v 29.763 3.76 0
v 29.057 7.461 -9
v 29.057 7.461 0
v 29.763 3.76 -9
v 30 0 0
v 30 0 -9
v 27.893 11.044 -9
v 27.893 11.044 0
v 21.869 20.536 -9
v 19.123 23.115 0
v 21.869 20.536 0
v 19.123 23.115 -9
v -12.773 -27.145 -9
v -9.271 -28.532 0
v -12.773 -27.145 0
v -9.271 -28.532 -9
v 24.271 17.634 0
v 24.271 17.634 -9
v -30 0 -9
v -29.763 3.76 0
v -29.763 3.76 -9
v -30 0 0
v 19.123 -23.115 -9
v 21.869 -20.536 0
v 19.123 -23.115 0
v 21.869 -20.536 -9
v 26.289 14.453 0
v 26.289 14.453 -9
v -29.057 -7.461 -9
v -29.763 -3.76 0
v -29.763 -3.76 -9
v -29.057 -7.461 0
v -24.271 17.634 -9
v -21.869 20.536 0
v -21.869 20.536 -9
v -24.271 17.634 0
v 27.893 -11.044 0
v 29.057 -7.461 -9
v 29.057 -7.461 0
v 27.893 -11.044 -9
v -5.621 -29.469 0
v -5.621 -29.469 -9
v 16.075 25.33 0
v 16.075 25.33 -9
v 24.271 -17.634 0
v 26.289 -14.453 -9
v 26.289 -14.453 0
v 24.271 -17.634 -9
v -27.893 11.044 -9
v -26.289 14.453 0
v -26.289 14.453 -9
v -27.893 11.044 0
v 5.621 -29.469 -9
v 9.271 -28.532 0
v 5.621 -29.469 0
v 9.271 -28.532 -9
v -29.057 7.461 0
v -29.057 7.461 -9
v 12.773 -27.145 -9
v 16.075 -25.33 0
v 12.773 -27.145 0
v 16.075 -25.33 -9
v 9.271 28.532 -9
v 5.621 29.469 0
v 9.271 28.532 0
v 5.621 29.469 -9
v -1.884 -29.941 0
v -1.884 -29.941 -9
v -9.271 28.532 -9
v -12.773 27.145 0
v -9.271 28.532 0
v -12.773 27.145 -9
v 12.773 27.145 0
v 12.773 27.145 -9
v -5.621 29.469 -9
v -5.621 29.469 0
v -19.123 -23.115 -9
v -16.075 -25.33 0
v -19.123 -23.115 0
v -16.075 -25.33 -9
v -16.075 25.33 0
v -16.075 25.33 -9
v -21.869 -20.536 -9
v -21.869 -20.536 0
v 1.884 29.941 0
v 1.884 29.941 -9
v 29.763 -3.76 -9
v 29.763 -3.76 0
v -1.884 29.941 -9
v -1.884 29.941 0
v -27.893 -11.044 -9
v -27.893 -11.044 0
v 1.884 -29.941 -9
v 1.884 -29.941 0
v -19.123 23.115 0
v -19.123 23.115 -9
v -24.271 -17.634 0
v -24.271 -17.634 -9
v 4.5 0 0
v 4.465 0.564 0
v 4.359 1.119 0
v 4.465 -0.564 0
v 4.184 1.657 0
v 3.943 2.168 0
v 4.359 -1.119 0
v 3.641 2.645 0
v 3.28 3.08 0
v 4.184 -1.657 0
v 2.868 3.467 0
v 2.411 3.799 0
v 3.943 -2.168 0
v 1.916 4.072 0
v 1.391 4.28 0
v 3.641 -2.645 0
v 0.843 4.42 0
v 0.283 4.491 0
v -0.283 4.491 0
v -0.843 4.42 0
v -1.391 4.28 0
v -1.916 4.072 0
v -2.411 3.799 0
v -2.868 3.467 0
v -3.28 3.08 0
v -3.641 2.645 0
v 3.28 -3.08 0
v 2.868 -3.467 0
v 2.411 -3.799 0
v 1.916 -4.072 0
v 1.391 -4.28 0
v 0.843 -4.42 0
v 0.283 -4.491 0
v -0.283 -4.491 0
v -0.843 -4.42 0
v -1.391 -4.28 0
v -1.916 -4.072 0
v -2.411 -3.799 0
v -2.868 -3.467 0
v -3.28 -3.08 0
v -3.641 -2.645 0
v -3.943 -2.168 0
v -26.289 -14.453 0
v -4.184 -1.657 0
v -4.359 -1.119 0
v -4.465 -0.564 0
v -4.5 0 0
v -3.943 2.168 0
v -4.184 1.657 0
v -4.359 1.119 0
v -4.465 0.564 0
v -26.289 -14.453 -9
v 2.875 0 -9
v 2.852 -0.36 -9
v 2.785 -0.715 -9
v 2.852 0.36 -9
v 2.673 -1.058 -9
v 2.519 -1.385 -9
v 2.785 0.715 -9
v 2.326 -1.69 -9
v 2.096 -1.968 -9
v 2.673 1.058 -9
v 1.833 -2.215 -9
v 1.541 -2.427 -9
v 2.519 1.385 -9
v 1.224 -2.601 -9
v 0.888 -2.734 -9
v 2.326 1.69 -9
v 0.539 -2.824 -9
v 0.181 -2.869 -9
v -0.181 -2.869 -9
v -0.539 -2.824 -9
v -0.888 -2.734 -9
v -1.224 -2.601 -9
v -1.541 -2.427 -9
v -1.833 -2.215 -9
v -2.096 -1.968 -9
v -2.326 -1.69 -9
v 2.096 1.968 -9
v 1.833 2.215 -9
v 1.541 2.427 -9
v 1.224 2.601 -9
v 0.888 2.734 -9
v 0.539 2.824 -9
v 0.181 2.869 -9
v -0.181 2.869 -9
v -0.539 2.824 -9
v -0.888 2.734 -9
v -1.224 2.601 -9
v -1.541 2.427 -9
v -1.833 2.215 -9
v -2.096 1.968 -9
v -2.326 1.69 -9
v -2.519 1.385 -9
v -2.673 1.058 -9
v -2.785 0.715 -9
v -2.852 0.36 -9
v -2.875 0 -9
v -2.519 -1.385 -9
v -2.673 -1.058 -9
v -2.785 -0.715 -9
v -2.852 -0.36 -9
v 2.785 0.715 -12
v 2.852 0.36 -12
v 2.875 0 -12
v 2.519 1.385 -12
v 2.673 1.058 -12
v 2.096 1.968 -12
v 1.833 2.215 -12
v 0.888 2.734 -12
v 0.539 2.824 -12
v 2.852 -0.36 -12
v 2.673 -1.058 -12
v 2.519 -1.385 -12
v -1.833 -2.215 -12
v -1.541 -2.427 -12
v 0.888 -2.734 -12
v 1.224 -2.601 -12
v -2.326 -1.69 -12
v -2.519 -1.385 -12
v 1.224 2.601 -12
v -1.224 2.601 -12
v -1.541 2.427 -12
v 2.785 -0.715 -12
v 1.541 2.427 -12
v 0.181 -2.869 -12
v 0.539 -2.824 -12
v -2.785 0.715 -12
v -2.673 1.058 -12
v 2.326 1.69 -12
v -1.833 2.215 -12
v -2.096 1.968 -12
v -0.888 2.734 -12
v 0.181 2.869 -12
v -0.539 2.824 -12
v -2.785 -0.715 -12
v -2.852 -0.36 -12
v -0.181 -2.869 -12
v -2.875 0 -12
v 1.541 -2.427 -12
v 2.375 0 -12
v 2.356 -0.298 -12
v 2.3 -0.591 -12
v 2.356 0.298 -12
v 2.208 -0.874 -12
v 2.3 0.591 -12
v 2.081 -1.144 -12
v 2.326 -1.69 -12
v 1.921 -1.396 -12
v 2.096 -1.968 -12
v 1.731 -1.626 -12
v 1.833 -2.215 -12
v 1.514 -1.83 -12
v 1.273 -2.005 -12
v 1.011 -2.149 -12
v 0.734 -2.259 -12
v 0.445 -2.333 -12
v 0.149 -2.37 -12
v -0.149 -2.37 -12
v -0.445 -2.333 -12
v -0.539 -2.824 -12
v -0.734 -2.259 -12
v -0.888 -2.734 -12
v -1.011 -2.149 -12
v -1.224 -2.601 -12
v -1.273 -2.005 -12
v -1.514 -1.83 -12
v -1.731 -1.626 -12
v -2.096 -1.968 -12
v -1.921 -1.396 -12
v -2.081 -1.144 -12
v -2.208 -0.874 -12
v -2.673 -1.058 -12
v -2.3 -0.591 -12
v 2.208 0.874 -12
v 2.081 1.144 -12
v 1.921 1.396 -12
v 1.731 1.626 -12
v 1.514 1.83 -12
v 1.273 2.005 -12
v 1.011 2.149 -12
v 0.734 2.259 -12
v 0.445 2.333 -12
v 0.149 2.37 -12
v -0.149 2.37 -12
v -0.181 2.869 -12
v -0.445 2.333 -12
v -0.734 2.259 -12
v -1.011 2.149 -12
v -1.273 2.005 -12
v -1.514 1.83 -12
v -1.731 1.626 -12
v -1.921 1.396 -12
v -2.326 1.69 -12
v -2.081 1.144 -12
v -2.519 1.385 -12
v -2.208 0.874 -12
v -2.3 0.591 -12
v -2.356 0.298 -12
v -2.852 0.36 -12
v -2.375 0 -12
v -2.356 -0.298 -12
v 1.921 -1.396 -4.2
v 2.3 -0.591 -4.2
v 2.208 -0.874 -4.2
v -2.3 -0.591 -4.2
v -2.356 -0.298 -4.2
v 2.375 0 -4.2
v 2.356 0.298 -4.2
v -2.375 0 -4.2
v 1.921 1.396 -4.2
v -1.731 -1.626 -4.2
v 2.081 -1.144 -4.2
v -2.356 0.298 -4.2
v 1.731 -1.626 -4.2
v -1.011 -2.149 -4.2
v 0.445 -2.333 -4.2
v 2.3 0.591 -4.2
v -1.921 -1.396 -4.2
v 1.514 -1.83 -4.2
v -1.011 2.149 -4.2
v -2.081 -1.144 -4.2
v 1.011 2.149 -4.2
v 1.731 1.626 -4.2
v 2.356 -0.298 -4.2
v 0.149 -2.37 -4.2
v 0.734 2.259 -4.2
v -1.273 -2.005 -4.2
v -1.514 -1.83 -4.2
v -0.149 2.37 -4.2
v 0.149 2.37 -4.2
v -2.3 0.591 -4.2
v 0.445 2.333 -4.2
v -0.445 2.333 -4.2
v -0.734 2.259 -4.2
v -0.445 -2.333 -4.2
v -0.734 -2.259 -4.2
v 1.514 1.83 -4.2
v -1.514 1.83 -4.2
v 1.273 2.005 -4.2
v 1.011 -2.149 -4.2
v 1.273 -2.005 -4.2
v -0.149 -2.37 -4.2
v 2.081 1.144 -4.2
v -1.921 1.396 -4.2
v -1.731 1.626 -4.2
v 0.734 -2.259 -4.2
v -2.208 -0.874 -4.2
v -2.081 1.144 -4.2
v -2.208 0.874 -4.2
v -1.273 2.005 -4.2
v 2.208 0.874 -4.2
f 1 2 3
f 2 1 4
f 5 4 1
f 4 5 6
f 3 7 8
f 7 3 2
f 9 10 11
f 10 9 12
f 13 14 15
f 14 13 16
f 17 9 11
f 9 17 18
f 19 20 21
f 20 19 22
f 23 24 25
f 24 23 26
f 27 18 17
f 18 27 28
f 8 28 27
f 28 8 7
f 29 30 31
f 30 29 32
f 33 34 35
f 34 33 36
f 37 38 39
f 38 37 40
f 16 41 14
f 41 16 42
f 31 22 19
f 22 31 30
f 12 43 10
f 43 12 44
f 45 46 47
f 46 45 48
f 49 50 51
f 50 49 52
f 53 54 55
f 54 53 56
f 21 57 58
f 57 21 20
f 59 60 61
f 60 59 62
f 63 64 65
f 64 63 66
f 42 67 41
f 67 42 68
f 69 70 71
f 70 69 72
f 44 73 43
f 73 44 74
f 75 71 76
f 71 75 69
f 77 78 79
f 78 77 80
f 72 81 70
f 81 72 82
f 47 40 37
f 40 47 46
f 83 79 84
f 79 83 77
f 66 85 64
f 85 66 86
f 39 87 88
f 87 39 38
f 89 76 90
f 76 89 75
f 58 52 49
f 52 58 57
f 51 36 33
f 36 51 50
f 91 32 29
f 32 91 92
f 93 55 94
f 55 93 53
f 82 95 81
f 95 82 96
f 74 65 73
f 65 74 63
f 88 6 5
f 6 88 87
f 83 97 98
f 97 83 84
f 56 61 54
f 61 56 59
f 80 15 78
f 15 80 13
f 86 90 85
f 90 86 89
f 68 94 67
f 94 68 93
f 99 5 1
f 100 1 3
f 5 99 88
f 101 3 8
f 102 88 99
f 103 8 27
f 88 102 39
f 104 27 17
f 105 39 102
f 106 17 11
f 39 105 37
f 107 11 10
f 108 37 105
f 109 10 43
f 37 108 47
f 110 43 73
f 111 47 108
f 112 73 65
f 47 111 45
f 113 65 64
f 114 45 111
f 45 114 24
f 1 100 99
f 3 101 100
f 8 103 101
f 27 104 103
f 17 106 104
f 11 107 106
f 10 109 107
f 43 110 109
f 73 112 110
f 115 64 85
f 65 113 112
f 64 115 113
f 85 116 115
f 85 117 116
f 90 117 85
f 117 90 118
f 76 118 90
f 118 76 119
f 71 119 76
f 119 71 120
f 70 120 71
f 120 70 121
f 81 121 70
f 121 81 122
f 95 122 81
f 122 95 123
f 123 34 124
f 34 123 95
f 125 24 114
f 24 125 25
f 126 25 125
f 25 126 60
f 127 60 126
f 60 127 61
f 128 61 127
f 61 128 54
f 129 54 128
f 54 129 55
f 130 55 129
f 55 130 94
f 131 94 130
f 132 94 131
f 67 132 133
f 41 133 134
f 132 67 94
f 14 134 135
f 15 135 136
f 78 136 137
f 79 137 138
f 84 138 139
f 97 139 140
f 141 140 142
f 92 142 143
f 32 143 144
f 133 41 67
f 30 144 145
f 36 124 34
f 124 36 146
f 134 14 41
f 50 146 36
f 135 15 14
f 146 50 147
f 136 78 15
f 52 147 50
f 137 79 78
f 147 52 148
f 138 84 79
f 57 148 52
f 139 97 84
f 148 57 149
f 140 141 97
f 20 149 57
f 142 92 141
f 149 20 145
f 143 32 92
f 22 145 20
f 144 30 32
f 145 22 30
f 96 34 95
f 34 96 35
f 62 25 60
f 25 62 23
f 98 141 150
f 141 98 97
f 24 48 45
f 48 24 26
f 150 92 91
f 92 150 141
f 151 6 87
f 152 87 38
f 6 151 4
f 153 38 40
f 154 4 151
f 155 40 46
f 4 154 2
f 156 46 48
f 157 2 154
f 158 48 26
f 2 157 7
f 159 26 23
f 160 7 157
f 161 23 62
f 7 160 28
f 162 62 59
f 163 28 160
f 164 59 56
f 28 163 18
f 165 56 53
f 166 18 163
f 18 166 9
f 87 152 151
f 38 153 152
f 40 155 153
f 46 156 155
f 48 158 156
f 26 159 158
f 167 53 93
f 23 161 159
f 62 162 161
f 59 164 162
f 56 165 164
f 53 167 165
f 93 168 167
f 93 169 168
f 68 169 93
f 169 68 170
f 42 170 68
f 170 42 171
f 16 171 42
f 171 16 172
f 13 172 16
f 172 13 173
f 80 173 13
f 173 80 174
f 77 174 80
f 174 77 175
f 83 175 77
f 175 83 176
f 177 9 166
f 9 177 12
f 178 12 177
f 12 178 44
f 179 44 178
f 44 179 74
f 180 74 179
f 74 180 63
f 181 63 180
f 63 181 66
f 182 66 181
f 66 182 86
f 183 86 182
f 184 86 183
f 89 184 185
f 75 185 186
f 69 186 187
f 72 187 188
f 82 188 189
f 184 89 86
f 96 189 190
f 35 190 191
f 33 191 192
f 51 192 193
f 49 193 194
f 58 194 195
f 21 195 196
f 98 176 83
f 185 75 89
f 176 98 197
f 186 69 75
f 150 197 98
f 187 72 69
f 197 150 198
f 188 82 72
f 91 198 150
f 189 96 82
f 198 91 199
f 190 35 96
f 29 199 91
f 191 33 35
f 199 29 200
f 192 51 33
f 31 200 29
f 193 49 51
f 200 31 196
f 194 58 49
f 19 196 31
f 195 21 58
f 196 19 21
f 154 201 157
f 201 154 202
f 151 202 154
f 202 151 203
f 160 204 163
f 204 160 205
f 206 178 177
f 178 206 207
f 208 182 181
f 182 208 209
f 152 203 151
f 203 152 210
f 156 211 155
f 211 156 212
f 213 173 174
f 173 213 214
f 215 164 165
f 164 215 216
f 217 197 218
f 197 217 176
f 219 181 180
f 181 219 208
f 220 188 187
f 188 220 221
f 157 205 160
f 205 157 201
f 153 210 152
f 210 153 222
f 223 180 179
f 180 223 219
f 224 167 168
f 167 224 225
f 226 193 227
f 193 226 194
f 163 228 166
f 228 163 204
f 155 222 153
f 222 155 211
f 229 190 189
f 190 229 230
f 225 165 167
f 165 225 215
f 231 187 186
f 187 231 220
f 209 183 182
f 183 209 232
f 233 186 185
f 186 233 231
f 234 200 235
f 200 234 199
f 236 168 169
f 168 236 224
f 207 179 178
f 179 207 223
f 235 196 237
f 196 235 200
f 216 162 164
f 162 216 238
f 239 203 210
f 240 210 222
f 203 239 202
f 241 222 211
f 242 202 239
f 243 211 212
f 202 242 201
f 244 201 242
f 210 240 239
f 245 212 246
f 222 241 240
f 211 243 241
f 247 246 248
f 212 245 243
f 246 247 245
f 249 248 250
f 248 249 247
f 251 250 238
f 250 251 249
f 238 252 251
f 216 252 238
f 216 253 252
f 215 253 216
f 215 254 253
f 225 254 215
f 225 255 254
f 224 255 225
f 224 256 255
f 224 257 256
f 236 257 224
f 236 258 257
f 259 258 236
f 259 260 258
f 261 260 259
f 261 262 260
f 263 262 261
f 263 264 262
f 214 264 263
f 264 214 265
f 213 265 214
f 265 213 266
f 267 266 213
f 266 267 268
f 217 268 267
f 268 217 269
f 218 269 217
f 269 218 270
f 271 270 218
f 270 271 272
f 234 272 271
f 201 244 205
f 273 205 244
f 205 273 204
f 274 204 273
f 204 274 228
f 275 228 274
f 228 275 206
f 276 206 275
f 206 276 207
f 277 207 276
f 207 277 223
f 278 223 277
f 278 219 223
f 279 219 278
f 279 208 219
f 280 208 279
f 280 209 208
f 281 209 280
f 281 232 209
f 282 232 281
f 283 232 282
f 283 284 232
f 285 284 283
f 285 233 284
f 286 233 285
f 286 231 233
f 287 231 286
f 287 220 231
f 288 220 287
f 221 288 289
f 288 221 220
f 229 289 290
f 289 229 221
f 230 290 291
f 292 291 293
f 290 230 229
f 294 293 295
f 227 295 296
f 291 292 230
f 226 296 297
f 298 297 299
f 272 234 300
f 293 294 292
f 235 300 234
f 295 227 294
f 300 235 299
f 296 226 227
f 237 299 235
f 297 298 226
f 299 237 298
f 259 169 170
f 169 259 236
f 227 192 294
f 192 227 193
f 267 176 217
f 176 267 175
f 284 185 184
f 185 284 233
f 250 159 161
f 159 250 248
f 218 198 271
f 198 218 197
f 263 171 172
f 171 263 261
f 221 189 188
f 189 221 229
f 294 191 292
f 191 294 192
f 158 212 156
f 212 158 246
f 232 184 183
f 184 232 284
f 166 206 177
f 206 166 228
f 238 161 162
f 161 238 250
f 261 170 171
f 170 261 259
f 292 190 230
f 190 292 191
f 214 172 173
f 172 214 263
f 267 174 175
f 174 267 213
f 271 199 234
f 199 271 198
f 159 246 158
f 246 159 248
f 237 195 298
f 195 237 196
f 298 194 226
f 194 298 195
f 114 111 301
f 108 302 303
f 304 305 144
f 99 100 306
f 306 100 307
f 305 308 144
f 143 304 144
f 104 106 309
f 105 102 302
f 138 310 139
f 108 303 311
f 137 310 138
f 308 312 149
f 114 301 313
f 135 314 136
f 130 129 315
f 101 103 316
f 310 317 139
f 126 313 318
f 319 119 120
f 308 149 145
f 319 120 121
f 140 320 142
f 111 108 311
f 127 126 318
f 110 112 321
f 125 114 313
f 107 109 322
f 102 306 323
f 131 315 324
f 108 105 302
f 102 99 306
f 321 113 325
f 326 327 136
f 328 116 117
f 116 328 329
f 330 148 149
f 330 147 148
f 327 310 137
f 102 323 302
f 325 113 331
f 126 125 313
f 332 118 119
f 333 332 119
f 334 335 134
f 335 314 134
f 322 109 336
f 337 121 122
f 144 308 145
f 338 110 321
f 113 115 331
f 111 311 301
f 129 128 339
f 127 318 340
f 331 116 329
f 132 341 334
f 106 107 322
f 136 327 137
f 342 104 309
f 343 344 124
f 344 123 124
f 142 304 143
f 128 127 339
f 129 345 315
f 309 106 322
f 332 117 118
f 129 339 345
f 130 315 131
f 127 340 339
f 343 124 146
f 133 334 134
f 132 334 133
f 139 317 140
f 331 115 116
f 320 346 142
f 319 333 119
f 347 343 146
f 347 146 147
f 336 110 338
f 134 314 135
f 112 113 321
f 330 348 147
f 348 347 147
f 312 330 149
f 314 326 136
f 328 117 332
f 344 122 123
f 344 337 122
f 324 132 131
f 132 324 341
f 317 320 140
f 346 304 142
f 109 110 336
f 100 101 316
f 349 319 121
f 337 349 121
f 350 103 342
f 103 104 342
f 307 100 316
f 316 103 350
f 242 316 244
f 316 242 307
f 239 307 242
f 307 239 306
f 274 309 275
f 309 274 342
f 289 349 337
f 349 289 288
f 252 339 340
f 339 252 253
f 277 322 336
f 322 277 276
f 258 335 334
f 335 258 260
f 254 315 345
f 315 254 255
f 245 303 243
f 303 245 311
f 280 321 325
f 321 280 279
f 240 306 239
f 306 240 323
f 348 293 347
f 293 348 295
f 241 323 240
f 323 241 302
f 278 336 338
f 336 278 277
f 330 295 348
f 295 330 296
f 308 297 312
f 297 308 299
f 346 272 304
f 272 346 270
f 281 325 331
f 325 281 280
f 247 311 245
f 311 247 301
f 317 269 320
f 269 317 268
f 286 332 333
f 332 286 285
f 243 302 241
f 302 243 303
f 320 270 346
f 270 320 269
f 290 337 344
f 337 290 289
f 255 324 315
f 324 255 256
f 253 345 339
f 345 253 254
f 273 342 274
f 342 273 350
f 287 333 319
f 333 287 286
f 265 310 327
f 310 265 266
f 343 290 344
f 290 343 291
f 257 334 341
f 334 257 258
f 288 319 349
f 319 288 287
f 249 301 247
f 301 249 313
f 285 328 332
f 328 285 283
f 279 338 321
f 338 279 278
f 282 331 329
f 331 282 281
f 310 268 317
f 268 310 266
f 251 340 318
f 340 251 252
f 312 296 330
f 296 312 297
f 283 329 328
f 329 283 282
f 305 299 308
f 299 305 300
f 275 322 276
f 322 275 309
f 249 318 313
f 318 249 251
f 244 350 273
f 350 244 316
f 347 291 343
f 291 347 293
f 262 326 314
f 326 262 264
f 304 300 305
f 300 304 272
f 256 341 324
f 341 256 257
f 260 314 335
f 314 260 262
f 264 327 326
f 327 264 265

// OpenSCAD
$fn = 50;

difference() {
	union() {
		translate(v = [0, 0, -9.0]) {
			cylinder(h = 9, r = 30.0);
		}
		#translate(v = [0, 0, -12.0]) {
			cylinder(h = 12, r = 2.875);
		}
	}
	union() {
		translate(v = [0, 0, 0]) {
			rotate(a = [0, 0, 0]) {
				difference() {
					union() {
						translate(v = [0, 0, -12.0]) {
							cylinder(h = 12, r = 2.25);
						}
						translate(v = [0, 0, -4.2]) {
							cylinder(h = 4.2, r1 = 2.375, r2 = 4.5);
						}
						translate(v = [0, 0, -12.0]) {
							cylinder(h = 12, r = 2.375);
						}
						translate(v = [0, 0, -12.0]) {
							cylinder(h = 12, r = 2.25);
						}
					}
					union();
				}
			}
		}
	}
}
